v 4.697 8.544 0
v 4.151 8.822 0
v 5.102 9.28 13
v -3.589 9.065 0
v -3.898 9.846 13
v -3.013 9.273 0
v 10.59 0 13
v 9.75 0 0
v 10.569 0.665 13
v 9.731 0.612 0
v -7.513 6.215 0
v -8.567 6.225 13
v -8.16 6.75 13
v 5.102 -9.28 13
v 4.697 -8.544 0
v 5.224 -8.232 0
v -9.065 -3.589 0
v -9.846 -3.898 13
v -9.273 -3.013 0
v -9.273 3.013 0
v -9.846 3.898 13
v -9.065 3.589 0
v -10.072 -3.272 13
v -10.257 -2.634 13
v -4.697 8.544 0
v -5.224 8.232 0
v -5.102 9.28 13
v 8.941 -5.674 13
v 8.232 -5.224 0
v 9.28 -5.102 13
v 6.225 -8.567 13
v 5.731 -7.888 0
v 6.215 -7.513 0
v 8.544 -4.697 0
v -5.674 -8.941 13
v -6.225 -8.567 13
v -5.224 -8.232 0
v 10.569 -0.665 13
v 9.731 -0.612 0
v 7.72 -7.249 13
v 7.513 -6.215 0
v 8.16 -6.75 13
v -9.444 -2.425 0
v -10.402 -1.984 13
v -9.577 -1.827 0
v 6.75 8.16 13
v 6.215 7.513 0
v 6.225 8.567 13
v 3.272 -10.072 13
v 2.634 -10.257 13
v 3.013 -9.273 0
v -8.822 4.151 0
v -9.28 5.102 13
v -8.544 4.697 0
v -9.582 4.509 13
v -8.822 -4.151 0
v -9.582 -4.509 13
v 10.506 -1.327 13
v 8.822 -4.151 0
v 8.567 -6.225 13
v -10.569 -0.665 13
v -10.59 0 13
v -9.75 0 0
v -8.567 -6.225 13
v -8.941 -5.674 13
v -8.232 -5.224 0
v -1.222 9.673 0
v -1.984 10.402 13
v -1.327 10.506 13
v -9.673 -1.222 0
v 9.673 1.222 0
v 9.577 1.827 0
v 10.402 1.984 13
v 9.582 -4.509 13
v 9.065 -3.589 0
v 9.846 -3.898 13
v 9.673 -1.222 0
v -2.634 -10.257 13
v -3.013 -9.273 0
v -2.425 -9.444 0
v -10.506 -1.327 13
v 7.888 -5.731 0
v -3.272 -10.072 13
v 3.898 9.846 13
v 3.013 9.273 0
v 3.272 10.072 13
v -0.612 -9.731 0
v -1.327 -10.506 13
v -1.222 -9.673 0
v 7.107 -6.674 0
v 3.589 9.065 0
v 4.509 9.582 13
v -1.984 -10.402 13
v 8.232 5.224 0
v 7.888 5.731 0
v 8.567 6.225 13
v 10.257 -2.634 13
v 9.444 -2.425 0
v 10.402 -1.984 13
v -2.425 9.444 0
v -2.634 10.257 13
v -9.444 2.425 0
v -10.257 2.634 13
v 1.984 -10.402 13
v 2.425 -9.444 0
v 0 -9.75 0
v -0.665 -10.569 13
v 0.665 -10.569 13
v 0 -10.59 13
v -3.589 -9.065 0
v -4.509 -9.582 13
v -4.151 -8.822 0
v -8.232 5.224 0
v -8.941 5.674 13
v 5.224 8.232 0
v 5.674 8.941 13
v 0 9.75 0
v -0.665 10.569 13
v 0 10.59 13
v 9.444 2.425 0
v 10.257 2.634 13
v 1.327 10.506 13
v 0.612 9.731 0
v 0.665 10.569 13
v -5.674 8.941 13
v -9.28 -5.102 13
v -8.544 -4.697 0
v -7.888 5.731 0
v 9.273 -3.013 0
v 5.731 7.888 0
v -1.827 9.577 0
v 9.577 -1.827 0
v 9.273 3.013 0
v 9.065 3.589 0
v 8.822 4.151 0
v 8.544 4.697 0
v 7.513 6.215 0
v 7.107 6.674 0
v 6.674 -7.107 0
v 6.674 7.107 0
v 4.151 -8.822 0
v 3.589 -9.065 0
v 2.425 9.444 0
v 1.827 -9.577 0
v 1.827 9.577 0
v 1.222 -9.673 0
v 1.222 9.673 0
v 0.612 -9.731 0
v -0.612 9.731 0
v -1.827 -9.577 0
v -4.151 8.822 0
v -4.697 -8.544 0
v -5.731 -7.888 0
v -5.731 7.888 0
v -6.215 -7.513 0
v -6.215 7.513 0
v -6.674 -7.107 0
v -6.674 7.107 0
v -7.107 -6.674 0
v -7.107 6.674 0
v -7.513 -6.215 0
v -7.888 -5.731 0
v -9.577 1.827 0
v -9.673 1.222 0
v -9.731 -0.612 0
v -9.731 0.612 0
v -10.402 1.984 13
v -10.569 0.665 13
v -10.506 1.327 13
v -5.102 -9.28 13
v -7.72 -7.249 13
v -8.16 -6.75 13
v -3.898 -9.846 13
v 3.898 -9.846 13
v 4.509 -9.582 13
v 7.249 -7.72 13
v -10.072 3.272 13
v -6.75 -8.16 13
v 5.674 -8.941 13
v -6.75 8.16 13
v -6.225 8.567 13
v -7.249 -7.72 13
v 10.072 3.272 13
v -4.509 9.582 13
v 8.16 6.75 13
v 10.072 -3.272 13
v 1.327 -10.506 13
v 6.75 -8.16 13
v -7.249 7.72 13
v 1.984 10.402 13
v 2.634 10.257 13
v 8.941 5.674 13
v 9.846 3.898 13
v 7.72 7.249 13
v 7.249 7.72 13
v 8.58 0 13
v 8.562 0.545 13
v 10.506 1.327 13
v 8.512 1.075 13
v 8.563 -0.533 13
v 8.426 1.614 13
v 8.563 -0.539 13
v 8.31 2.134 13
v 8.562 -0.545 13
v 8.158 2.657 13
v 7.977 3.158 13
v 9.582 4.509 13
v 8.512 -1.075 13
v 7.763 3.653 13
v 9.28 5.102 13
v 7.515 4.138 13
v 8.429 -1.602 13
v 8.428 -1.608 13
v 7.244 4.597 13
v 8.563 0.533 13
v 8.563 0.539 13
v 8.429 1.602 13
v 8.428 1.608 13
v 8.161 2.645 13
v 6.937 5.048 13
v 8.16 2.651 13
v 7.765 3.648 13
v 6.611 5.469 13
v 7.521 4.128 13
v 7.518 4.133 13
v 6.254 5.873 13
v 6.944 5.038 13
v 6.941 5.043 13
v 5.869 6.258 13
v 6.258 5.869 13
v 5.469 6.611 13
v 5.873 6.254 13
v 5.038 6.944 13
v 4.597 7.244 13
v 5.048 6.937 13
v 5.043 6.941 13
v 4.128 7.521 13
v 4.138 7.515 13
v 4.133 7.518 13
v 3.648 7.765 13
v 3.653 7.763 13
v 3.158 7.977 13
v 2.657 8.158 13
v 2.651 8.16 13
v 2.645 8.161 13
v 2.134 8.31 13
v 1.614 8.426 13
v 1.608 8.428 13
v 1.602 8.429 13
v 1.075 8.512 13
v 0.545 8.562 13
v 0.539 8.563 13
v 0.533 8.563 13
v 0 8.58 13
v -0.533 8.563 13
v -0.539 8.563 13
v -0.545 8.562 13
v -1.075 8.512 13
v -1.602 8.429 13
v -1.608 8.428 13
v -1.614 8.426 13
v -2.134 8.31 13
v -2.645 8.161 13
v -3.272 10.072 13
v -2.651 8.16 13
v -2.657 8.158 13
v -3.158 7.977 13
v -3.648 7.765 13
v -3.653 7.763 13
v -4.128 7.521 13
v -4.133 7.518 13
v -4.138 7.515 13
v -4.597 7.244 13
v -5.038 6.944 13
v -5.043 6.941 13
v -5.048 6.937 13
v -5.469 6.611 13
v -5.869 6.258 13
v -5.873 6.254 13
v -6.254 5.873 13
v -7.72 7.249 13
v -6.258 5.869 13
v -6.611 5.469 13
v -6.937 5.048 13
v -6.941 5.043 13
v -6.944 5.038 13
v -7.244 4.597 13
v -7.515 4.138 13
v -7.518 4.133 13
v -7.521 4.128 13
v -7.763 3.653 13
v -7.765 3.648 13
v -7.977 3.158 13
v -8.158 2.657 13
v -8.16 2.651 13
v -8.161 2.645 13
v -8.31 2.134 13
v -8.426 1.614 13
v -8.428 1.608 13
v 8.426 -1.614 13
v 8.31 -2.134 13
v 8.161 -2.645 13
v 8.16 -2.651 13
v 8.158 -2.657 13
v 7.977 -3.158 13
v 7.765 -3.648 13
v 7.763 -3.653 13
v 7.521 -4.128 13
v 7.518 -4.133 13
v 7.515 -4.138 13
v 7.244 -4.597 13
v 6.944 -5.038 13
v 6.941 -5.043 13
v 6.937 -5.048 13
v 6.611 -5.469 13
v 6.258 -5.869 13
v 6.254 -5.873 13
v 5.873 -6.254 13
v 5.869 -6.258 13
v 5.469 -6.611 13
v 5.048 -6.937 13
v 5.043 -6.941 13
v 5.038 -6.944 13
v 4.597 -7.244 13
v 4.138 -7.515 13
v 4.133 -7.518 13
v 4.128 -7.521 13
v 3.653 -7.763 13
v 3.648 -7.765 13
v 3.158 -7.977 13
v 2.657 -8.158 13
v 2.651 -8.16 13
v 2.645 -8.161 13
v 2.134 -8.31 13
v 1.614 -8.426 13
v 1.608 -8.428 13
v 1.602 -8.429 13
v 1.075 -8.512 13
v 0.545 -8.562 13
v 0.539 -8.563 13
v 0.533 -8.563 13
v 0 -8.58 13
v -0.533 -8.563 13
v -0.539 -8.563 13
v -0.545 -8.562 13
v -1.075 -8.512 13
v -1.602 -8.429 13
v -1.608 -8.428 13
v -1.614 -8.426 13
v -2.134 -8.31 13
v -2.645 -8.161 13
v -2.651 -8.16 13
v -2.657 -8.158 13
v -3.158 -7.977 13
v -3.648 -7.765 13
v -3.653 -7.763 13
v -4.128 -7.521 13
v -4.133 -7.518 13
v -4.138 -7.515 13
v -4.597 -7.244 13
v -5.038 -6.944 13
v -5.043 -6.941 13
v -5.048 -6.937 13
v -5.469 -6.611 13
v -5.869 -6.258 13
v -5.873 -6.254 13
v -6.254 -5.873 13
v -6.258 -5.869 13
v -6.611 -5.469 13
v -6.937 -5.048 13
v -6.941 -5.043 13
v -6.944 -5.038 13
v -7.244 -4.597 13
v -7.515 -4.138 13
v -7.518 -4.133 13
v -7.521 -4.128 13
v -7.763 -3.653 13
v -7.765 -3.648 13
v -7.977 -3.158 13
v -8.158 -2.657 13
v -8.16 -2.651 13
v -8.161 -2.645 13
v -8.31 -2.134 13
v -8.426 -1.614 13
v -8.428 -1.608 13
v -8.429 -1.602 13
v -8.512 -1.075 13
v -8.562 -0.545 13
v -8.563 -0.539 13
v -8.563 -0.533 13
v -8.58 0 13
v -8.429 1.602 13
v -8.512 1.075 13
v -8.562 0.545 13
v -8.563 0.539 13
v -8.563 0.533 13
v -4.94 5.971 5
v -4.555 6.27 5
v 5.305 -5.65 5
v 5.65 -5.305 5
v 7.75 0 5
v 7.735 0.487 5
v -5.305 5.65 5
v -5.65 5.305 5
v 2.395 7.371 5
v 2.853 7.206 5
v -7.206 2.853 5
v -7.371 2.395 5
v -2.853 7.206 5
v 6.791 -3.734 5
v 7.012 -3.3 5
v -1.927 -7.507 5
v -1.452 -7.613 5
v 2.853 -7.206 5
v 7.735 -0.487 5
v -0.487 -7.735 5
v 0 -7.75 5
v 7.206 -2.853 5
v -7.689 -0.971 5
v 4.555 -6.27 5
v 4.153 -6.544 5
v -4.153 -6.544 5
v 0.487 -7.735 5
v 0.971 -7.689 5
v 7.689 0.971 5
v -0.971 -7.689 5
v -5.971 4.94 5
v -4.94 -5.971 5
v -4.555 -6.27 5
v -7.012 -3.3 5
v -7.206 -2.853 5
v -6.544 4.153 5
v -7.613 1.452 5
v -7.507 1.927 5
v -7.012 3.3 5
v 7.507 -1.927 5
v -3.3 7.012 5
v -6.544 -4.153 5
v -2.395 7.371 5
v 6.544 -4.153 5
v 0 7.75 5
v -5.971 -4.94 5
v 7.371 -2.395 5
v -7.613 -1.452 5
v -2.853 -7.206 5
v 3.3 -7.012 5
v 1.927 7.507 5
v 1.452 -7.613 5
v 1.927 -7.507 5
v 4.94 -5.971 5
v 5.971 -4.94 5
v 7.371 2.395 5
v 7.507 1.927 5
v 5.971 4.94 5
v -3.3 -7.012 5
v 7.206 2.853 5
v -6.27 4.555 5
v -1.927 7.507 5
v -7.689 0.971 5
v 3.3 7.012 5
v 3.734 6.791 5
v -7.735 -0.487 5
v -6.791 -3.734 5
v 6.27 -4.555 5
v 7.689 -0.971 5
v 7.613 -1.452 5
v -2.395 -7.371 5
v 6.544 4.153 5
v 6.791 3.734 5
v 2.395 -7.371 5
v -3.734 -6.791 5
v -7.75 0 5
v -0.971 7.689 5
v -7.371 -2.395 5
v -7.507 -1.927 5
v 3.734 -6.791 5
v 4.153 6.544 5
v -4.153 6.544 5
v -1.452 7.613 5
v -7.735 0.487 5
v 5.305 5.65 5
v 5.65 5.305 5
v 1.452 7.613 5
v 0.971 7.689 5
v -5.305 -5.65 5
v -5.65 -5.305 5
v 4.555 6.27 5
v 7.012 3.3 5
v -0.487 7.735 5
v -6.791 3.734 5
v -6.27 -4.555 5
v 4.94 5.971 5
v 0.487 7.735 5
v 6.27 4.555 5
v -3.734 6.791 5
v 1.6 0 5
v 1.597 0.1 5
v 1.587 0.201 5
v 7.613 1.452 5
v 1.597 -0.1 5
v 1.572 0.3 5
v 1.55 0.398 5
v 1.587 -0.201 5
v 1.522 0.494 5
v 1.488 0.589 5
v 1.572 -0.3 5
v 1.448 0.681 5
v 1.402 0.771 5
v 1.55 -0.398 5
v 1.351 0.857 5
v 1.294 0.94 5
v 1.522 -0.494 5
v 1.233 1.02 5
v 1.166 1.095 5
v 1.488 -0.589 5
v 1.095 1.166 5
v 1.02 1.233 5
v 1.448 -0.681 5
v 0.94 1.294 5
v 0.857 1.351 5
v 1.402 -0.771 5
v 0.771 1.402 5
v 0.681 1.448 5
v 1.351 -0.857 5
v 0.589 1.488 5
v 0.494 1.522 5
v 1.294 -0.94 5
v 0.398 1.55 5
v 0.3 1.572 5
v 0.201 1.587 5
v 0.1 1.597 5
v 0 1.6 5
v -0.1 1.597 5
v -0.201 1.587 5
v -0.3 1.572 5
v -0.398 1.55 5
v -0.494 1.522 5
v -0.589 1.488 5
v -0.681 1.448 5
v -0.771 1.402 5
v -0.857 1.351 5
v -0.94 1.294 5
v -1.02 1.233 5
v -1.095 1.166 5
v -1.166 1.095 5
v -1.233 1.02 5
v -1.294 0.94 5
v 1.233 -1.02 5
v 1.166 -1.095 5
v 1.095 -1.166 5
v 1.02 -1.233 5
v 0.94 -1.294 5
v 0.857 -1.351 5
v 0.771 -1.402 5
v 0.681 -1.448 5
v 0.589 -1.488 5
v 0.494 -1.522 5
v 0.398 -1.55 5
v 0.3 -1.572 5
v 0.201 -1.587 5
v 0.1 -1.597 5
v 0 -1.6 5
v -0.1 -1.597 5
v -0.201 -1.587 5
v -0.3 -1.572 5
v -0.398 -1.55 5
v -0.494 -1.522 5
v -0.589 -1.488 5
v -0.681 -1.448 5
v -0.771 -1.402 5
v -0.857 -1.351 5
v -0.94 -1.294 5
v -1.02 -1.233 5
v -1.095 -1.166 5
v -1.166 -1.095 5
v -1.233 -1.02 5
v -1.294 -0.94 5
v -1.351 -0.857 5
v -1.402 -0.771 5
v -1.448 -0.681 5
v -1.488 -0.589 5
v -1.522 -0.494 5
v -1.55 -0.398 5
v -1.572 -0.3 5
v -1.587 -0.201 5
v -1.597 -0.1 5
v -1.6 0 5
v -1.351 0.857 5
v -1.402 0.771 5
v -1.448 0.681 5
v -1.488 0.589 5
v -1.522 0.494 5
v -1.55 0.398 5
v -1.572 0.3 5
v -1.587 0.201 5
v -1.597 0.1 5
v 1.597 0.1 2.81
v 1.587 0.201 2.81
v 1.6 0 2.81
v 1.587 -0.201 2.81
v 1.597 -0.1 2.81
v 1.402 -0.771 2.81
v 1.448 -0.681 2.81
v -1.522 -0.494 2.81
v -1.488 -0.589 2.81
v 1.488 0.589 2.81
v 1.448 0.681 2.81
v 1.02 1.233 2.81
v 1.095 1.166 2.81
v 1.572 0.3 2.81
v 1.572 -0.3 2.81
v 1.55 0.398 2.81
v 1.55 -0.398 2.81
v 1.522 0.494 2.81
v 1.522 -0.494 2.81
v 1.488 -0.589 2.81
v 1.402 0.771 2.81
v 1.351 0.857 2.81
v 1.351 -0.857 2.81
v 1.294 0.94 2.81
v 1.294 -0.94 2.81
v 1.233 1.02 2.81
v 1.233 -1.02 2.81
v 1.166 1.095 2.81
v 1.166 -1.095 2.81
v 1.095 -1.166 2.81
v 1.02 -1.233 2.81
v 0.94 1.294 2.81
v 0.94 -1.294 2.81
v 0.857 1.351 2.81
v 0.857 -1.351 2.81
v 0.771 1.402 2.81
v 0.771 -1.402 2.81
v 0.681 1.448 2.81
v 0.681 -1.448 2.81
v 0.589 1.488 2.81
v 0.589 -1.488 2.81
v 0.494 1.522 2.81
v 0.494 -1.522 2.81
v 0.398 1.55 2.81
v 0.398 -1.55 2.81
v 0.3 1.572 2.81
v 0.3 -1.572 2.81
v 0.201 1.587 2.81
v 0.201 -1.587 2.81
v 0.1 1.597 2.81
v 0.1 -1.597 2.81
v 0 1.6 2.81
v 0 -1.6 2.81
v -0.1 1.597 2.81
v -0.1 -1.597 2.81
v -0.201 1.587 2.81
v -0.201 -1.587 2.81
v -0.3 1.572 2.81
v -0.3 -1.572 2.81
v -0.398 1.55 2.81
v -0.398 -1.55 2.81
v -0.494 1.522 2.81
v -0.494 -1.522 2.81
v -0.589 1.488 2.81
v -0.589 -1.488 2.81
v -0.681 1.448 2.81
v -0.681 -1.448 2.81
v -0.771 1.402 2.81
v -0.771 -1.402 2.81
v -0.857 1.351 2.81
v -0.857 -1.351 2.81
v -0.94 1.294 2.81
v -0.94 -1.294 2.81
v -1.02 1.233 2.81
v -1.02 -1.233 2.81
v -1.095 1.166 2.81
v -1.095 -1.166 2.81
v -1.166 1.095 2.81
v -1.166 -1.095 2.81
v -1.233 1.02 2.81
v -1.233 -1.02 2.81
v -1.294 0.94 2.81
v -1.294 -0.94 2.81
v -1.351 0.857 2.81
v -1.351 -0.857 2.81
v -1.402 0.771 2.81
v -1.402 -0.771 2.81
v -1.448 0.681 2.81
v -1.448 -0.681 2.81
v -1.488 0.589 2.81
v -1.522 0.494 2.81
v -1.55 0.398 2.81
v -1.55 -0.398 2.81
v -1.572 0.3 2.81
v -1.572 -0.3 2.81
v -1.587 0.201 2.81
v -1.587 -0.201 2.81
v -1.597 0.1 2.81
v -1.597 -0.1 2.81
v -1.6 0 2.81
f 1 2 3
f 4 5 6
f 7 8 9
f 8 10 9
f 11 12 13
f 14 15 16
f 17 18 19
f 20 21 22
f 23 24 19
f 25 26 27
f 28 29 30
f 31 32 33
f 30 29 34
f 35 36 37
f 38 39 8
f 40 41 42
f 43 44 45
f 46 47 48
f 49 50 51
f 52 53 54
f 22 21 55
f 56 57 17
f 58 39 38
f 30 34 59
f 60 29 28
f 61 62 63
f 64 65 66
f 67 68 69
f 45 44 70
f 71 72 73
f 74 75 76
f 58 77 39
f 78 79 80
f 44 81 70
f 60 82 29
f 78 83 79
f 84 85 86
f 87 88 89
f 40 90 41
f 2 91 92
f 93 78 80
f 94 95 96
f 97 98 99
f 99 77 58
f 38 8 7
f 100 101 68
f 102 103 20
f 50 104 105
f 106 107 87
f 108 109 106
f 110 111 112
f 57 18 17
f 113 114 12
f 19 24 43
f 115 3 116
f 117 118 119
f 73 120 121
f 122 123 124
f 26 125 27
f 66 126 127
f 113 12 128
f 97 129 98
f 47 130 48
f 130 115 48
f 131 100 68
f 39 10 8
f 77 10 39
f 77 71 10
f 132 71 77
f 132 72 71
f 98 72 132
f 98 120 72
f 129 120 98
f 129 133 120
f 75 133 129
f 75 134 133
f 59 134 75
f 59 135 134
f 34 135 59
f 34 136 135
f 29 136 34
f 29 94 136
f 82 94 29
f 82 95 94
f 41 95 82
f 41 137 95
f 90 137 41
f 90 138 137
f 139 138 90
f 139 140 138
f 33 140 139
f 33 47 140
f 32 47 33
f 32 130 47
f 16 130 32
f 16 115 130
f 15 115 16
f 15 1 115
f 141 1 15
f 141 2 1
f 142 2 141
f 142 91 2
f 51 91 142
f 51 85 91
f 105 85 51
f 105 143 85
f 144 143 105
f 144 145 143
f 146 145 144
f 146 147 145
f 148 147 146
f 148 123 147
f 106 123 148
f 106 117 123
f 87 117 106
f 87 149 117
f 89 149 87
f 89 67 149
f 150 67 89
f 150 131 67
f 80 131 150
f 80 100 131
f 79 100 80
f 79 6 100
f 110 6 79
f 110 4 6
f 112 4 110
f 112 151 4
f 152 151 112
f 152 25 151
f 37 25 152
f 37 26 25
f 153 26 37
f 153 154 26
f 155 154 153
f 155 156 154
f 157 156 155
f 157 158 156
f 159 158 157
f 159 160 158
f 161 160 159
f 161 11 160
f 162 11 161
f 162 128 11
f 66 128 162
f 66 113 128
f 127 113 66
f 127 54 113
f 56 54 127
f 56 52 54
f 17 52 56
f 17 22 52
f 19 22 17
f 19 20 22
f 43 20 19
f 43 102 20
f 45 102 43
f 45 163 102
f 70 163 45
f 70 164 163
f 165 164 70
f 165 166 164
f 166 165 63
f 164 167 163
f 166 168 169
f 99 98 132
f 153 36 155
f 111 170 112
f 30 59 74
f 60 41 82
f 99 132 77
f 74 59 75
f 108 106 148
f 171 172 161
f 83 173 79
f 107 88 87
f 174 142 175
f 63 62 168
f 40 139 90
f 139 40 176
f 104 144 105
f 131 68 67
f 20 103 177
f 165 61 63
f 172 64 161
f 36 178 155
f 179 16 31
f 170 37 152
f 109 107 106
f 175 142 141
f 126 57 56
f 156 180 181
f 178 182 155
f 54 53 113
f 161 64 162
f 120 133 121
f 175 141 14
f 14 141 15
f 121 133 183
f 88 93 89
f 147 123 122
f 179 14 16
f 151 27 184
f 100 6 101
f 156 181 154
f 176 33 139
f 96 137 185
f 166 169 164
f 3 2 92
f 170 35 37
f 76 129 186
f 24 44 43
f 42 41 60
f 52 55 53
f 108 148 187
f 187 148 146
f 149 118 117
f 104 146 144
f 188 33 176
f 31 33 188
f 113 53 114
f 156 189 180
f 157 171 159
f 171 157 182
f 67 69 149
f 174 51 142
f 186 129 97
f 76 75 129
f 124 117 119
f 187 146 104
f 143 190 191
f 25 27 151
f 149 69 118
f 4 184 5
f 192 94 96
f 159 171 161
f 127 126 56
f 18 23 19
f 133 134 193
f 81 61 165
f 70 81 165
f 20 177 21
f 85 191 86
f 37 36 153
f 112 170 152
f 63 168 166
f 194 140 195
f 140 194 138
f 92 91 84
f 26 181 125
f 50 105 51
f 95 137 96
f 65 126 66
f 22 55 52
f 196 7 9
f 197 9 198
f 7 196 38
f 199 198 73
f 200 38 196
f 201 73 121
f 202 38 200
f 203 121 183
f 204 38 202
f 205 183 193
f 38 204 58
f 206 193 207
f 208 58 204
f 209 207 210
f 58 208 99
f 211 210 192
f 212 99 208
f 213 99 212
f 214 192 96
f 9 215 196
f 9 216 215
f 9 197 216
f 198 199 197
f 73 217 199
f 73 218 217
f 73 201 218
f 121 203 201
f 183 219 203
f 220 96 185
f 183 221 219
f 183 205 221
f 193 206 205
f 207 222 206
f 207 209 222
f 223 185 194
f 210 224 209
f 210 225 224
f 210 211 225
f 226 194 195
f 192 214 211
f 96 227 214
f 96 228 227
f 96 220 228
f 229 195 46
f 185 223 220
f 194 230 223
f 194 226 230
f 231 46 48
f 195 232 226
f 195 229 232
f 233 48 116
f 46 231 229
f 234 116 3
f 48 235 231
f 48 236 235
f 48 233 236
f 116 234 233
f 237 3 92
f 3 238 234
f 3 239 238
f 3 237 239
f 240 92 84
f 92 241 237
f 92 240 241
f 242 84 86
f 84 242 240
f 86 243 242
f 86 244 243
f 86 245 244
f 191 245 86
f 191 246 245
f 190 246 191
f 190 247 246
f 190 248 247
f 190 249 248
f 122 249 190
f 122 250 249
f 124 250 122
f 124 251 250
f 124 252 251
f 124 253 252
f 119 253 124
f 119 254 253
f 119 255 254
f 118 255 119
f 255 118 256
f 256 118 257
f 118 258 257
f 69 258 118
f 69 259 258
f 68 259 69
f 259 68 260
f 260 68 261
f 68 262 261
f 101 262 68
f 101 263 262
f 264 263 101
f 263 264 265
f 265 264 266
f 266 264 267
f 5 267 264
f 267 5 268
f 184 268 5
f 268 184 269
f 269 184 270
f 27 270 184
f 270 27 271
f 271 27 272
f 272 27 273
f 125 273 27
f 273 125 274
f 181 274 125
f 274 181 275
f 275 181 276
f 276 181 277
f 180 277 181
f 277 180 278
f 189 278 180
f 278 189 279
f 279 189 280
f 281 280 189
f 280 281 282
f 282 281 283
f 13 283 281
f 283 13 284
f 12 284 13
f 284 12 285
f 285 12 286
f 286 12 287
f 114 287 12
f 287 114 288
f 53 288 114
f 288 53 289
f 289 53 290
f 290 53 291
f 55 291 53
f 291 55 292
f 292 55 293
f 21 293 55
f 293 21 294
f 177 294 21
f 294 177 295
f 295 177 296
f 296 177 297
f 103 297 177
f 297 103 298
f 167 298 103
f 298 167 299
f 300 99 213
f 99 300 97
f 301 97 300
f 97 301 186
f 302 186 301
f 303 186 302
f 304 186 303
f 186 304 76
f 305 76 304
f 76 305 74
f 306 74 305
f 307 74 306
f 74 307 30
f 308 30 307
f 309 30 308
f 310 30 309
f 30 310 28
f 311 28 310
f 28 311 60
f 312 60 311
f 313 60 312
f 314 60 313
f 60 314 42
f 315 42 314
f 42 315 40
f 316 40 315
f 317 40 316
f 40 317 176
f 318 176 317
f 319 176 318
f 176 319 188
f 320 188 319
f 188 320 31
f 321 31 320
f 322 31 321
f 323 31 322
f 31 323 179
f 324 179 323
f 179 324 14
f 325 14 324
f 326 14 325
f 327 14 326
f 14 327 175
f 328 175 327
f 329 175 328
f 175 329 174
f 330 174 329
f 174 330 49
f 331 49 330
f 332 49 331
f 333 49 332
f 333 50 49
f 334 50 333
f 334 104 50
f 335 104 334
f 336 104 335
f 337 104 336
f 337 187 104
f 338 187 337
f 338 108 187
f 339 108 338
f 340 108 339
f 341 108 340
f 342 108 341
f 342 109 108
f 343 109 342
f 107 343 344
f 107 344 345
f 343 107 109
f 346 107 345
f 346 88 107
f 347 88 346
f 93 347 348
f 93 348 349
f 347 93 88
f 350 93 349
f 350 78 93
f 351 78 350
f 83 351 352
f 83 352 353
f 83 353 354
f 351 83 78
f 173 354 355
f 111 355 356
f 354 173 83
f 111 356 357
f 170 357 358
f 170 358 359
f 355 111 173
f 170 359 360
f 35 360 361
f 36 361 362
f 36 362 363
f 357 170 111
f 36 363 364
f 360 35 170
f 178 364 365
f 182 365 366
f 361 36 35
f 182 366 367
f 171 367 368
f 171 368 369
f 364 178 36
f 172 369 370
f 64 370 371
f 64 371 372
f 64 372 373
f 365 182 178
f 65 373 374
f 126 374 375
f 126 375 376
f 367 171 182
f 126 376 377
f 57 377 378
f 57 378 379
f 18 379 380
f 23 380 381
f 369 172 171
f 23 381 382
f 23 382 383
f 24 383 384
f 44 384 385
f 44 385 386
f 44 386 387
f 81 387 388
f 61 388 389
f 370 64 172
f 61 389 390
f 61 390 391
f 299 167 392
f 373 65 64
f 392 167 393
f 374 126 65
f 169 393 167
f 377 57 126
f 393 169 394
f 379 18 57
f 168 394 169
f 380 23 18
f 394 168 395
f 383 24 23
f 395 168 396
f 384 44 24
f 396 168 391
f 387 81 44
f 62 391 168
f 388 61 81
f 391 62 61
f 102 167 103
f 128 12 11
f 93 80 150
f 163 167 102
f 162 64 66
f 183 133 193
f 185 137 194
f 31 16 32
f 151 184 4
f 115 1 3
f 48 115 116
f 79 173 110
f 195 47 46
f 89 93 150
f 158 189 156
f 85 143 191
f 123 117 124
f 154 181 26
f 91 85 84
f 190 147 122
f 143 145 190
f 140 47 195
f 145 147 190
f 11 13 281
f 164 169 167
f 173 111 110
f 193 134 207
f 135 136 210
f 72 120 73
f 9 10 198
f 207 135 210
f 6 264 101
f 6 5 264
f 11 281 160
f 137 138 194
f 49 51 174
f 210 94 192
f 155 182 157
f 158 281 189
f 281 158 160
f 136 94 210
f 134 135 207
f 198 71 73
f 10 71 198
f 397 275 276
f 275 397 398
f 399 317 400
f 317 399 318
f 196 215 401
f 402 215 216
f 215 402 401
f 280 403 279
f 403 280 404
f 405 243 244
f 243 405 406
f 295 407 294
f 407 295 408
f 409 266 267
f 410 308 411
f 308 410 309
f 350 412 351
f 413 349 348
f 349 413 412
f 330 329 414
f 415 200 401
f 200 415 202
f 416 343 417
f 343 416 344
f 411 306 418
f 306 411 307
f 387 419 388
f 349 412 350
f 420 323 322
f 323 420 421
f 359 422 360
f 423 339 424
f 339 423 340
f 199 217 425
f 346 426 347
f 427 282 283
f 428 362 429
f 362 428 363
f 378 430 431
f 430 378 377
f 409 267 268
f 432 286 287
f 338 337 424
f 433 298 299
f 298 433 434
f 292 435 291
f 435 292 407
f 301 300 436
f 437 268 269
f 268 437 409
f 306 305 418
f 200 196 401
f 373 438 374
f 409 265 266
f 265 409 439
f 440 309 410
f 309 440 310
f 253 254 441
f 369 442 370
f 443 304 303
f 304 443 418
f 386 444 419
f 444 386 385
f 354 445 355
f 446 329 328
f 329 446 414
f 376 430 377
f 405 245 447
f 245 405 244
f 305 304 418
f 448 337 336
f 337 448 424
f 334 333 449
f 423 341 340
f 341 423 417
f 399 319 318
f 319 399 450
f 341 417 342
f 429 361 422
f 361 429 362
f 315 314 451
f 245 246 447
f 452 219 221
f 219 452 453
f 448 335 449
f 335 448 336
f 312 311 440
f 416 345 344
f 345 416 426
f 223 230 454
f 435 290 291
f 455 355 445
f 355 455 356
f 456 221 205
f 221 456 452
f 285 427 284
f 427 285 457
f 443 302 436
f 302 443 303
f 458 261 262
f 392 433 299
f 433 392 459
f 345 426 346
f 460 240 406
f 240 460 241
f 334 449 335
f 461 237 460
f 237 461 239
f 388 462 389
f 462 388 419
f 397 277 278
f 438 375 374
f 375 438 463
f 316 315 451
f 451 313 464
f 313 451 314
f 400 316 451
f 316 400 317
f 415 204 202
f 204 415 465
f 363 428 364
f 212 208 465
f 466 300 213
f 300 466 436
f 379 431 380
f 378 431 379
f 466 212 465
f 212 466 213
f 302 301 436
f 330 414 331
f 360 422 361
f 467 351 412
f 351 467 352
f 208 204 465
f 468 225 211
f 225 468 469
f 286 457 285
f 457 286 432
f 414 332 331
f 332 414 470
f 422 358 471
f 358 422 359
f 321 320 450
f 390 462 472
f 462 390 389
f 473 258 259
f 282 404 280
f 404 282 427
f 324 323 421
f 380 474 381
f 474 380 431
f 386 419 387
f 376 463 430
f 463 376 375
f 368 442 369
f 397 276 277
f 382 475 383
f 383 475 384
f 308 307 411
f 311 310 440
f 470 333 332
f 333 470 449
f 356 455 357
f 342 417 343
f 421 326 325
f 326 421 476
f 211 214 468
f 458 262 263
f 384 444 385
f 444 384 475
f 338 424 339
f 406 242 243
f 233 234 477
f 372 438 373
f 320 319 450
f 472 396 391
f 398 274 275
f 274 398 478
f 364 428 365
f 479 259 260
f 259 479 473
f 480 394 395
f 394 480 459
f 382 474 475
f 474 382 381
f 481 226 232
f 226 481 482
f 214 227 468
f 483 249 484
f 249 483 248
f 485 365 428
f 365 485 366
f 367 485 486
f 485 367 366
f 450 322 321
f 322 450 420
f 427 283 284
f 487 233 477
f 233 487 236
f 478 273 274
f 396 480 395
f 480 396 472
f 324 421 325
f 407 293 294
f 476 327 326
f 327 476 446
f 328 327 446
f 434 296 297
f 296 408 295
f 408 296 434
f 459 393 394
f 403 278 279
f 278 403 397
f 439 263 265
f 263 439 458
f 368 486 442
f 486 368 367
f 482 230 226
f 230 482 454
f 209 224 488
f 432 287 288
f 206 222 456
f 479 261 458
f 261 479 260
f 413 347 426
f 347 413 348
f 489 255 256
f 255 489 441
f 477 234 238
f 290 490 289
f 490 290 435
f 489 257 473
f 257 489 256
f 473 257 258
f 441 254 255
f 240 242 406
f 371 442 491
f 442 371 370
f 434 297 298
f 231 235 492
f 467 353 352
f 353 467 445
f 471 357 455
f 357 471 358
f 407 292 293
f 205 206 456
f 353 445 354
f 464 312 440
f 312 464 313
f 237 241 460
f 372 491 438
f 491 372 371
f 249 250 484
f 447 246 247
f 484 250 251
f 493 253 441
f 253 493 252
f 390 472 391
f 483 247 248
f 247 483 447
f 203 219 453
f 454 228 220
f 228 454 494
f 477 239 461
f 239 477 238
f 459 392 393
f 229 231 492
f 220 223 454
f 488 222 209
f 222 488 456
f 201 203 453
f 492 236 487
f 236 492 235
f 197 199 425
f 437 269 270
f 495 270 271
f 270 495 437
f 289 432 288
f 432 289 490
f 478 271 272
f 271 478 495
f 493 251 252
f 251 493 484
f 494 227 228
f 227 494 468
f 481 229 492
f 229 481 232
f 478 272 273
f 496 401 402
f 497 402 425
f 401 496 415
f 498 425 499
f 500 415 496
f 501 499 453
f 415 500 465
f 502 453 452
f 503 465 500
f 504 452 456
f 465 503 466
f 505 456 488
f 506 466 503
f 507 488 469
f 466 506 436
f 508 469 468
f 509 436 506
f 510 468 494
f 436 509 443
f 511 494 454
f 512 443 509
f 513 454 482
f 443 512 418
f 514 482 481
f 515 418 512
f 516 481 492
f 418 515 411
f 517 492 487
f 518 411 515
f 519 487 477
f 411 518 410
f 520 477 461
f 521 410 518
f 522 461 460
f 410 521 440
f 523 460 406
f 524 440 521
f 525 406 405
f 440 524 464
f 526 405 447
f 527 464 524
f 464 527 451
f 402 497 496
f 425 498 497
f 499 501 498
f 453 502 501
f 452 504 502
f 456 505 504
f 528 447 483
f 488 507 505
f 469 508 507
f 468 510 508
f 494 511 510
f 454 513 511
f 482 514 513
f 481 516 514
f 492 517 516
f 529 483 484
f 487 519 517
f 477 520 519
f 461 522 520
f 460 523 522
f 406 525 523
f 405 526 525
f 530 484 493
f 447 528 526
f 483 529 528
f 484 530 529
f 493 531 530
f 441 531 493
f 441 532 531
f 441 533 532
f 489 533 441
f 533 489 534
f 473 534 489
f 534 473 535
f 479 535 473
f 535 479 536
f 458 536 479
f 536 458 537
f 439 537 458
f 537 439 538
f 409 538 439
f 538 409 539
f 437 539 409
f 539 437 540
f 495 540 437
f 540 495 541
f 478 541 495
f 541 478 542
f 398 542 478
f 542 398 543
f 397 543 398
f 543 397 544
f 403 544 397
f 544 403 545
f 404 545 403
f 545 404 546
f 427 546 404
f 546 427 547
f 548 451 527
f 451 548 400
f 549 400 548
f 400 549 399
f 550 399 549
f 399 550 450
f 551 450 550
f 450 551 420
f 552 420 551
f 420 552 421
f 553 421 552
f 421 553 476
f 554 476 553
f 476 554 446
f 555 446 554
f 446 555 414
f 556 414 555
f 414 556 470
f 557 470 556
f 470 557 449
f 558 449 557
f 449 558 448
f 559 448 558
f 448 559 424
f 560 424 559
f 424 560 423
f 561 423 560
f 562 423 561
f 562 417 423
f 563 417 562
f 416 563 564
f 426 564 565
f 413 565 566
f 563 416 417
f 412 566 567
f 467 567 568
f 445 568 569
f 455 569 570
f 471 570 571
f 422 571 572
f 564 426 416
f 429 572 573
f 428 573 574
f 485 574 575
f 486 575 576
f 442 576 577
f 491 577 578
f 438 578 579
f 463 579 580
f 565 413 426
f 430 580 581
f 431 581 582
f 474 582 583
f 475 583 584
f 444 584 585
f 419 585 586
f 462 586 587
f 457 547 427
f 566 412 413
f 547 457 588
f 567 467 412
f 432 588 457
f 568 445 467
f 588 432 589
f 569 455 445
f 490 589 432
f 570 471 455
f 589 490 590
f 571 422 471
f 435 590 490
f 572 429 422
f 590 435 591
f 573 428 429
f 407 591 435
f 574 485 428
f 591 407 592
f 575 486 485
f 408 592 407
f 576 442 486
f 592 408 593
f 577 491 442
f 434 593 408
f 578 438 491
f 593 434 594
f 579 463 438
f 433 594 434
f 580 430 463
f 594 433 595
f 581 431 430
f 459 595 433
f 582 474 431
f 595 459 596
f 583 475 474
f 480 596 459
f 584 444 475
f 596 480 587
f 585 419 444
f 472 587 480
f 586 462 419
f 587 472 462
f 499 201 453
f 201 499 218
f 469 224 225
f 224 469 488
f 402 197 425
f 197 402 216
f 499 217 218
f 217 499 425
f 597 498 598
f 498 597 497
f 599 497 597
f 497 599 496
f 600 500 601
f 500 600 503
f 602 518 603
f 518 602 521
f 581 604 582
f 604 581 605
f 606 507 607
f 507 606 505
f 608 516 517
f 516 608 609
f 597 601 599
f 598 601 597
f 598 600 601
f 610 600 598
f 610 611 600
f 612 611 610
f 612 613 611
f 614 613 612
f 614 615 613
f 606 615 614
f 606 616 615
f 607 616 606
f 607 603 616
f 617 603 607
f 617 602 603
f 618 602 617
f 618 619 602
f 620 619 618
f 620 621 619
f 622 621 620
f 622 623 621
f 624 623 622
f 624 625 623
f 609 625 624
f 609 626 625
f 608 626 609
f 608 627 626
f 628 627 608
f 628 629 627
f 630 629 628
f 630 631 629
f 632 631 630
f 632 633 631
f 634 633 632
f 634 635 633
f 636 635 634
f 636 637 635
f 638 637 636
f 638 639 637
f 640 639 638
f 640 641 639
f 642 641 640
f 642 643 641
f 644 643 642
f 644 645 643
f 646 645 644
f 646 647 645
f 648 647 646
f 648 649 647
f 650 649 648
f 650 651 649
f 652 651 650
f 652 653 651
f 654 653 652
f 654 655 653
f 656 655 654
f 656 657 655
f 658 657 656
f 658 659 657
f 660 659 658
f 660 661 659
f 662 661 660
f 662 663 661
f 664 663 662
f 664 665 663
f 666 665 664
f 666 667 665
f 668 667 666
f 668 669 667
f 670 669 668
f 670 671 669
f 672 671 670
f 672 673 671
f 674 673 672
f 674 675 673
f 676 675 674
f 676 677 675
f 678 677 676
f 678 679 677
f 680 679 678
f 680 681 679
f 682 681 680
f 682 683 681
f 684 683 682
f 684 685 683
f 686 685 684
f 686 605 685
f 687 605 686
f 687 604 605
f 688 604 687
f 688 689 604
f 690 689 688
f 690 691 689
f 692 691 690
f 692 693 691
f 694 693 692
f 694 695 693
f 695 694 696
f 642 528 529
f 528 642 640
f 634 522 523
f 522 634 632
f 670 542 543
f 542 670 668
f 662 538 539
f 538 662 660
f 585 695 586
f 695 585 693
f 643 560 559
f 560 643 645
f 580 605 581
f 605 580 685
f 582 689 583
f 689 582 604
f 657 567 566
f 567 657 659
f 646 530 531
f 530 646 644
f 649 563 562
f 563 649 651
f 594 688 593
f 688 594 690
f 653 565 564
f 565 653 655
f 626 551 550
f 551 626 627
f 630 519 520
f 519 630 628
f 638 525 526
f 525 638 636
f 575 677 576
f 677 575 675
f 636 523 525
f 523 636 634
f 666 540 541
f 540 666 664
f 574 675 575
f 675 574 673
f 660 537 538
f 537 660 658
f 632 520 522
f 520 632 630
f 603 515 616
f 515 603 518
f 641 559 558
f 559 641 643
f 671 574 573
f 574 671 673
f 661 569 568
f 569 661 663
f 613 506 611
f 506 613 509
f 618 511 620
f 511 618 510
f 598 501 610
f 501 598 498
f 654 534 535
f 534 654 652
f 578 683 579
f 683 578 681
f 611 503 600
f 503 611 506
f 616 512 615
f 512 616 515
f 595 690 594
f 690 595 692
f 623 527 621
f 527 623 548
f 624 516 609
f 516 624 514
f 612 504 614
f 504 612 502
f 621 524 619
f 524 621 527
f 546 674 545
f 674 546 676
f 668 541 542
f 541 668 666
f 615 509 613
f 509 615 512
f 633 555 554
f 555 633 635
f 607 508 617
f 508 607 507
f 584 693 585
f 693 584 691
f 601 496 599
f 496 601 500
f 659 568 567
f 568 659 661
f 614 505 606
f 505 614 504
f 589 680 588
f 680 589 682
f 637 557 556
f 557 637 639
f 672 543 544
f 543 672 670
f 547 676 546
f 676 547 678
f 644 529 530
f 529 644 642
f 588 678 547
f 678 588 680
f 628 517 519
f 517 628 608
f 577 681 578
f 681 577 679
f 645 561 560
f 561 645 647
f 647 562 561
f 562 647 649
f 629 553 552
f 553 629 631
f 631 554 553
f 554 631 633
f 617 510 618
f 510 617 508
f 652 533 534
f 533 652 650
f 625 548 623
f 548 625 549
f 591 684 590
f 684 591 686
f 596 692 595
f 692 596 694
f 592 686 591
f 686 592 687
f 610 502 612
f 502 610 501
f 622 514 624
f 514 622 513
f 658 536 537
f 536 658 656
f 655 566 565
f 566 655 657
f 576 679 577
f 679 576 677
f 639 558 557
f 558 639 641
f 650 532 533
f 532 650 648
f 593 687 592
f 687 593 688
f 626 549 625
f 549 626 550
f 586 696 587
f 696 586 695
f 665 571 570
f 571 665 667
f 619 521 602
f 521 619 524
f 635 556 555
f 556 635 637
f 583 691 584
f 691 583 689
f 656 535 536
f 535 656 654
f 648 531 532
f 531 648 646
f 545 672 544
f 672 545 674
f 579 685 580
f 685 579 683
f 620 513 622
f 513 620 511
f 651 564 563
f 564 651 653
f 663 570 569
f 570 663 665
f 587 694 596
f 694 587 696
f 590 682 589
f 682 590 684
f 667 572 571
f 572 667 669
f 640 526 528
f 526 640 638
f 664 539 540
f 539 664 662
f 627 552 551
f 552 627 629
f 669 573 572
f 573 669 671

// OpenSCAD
// --- Parameters ---
$fn = 100;              

inner_bottom = 15.50;   
inner_top = 17.18;      
depth = 8.0;            
wall_thickness = 2.0;   
base_thickness = 5.0;   // Thick enough to hold a 2mm magnet + 3mm of floor

// Magnet Dimensions (3x2mm)
mag_d = 3.0 + 0.2;      // Diameter + tolerance for fit
mag_h = 2.0 + 0.2;      // Height + tolerance

// Calculated outer dimensions
outer_bottom = inner_bottom + (wall_thickness * 2);
outer_top = inner_top + (wall_thickness * 2);
total_height = depth + base_thickness;

// --- The Model ---
difference() {
    // 1. The Main Body (Outer Shell)
    cylinder(h = total_height, d1 = outer_bottom, d2 = outer_top);

    // 2. The Main Inner Hole (The tapered cavity)
    translate([0, 0, base_thickness])
        cylinder(h = depth + 0.1, d1 = inner_bottom, d2 = inner_top);

    // 3. The Internal Magnet Pocket 
    // This starts at the "floor" of the inner hole and goes DOWN 2mm
    translate([0, 0, base_thickness - mag_h + 0.01]) 
        cylinder(h = mag_h, d = mag_d);
}
